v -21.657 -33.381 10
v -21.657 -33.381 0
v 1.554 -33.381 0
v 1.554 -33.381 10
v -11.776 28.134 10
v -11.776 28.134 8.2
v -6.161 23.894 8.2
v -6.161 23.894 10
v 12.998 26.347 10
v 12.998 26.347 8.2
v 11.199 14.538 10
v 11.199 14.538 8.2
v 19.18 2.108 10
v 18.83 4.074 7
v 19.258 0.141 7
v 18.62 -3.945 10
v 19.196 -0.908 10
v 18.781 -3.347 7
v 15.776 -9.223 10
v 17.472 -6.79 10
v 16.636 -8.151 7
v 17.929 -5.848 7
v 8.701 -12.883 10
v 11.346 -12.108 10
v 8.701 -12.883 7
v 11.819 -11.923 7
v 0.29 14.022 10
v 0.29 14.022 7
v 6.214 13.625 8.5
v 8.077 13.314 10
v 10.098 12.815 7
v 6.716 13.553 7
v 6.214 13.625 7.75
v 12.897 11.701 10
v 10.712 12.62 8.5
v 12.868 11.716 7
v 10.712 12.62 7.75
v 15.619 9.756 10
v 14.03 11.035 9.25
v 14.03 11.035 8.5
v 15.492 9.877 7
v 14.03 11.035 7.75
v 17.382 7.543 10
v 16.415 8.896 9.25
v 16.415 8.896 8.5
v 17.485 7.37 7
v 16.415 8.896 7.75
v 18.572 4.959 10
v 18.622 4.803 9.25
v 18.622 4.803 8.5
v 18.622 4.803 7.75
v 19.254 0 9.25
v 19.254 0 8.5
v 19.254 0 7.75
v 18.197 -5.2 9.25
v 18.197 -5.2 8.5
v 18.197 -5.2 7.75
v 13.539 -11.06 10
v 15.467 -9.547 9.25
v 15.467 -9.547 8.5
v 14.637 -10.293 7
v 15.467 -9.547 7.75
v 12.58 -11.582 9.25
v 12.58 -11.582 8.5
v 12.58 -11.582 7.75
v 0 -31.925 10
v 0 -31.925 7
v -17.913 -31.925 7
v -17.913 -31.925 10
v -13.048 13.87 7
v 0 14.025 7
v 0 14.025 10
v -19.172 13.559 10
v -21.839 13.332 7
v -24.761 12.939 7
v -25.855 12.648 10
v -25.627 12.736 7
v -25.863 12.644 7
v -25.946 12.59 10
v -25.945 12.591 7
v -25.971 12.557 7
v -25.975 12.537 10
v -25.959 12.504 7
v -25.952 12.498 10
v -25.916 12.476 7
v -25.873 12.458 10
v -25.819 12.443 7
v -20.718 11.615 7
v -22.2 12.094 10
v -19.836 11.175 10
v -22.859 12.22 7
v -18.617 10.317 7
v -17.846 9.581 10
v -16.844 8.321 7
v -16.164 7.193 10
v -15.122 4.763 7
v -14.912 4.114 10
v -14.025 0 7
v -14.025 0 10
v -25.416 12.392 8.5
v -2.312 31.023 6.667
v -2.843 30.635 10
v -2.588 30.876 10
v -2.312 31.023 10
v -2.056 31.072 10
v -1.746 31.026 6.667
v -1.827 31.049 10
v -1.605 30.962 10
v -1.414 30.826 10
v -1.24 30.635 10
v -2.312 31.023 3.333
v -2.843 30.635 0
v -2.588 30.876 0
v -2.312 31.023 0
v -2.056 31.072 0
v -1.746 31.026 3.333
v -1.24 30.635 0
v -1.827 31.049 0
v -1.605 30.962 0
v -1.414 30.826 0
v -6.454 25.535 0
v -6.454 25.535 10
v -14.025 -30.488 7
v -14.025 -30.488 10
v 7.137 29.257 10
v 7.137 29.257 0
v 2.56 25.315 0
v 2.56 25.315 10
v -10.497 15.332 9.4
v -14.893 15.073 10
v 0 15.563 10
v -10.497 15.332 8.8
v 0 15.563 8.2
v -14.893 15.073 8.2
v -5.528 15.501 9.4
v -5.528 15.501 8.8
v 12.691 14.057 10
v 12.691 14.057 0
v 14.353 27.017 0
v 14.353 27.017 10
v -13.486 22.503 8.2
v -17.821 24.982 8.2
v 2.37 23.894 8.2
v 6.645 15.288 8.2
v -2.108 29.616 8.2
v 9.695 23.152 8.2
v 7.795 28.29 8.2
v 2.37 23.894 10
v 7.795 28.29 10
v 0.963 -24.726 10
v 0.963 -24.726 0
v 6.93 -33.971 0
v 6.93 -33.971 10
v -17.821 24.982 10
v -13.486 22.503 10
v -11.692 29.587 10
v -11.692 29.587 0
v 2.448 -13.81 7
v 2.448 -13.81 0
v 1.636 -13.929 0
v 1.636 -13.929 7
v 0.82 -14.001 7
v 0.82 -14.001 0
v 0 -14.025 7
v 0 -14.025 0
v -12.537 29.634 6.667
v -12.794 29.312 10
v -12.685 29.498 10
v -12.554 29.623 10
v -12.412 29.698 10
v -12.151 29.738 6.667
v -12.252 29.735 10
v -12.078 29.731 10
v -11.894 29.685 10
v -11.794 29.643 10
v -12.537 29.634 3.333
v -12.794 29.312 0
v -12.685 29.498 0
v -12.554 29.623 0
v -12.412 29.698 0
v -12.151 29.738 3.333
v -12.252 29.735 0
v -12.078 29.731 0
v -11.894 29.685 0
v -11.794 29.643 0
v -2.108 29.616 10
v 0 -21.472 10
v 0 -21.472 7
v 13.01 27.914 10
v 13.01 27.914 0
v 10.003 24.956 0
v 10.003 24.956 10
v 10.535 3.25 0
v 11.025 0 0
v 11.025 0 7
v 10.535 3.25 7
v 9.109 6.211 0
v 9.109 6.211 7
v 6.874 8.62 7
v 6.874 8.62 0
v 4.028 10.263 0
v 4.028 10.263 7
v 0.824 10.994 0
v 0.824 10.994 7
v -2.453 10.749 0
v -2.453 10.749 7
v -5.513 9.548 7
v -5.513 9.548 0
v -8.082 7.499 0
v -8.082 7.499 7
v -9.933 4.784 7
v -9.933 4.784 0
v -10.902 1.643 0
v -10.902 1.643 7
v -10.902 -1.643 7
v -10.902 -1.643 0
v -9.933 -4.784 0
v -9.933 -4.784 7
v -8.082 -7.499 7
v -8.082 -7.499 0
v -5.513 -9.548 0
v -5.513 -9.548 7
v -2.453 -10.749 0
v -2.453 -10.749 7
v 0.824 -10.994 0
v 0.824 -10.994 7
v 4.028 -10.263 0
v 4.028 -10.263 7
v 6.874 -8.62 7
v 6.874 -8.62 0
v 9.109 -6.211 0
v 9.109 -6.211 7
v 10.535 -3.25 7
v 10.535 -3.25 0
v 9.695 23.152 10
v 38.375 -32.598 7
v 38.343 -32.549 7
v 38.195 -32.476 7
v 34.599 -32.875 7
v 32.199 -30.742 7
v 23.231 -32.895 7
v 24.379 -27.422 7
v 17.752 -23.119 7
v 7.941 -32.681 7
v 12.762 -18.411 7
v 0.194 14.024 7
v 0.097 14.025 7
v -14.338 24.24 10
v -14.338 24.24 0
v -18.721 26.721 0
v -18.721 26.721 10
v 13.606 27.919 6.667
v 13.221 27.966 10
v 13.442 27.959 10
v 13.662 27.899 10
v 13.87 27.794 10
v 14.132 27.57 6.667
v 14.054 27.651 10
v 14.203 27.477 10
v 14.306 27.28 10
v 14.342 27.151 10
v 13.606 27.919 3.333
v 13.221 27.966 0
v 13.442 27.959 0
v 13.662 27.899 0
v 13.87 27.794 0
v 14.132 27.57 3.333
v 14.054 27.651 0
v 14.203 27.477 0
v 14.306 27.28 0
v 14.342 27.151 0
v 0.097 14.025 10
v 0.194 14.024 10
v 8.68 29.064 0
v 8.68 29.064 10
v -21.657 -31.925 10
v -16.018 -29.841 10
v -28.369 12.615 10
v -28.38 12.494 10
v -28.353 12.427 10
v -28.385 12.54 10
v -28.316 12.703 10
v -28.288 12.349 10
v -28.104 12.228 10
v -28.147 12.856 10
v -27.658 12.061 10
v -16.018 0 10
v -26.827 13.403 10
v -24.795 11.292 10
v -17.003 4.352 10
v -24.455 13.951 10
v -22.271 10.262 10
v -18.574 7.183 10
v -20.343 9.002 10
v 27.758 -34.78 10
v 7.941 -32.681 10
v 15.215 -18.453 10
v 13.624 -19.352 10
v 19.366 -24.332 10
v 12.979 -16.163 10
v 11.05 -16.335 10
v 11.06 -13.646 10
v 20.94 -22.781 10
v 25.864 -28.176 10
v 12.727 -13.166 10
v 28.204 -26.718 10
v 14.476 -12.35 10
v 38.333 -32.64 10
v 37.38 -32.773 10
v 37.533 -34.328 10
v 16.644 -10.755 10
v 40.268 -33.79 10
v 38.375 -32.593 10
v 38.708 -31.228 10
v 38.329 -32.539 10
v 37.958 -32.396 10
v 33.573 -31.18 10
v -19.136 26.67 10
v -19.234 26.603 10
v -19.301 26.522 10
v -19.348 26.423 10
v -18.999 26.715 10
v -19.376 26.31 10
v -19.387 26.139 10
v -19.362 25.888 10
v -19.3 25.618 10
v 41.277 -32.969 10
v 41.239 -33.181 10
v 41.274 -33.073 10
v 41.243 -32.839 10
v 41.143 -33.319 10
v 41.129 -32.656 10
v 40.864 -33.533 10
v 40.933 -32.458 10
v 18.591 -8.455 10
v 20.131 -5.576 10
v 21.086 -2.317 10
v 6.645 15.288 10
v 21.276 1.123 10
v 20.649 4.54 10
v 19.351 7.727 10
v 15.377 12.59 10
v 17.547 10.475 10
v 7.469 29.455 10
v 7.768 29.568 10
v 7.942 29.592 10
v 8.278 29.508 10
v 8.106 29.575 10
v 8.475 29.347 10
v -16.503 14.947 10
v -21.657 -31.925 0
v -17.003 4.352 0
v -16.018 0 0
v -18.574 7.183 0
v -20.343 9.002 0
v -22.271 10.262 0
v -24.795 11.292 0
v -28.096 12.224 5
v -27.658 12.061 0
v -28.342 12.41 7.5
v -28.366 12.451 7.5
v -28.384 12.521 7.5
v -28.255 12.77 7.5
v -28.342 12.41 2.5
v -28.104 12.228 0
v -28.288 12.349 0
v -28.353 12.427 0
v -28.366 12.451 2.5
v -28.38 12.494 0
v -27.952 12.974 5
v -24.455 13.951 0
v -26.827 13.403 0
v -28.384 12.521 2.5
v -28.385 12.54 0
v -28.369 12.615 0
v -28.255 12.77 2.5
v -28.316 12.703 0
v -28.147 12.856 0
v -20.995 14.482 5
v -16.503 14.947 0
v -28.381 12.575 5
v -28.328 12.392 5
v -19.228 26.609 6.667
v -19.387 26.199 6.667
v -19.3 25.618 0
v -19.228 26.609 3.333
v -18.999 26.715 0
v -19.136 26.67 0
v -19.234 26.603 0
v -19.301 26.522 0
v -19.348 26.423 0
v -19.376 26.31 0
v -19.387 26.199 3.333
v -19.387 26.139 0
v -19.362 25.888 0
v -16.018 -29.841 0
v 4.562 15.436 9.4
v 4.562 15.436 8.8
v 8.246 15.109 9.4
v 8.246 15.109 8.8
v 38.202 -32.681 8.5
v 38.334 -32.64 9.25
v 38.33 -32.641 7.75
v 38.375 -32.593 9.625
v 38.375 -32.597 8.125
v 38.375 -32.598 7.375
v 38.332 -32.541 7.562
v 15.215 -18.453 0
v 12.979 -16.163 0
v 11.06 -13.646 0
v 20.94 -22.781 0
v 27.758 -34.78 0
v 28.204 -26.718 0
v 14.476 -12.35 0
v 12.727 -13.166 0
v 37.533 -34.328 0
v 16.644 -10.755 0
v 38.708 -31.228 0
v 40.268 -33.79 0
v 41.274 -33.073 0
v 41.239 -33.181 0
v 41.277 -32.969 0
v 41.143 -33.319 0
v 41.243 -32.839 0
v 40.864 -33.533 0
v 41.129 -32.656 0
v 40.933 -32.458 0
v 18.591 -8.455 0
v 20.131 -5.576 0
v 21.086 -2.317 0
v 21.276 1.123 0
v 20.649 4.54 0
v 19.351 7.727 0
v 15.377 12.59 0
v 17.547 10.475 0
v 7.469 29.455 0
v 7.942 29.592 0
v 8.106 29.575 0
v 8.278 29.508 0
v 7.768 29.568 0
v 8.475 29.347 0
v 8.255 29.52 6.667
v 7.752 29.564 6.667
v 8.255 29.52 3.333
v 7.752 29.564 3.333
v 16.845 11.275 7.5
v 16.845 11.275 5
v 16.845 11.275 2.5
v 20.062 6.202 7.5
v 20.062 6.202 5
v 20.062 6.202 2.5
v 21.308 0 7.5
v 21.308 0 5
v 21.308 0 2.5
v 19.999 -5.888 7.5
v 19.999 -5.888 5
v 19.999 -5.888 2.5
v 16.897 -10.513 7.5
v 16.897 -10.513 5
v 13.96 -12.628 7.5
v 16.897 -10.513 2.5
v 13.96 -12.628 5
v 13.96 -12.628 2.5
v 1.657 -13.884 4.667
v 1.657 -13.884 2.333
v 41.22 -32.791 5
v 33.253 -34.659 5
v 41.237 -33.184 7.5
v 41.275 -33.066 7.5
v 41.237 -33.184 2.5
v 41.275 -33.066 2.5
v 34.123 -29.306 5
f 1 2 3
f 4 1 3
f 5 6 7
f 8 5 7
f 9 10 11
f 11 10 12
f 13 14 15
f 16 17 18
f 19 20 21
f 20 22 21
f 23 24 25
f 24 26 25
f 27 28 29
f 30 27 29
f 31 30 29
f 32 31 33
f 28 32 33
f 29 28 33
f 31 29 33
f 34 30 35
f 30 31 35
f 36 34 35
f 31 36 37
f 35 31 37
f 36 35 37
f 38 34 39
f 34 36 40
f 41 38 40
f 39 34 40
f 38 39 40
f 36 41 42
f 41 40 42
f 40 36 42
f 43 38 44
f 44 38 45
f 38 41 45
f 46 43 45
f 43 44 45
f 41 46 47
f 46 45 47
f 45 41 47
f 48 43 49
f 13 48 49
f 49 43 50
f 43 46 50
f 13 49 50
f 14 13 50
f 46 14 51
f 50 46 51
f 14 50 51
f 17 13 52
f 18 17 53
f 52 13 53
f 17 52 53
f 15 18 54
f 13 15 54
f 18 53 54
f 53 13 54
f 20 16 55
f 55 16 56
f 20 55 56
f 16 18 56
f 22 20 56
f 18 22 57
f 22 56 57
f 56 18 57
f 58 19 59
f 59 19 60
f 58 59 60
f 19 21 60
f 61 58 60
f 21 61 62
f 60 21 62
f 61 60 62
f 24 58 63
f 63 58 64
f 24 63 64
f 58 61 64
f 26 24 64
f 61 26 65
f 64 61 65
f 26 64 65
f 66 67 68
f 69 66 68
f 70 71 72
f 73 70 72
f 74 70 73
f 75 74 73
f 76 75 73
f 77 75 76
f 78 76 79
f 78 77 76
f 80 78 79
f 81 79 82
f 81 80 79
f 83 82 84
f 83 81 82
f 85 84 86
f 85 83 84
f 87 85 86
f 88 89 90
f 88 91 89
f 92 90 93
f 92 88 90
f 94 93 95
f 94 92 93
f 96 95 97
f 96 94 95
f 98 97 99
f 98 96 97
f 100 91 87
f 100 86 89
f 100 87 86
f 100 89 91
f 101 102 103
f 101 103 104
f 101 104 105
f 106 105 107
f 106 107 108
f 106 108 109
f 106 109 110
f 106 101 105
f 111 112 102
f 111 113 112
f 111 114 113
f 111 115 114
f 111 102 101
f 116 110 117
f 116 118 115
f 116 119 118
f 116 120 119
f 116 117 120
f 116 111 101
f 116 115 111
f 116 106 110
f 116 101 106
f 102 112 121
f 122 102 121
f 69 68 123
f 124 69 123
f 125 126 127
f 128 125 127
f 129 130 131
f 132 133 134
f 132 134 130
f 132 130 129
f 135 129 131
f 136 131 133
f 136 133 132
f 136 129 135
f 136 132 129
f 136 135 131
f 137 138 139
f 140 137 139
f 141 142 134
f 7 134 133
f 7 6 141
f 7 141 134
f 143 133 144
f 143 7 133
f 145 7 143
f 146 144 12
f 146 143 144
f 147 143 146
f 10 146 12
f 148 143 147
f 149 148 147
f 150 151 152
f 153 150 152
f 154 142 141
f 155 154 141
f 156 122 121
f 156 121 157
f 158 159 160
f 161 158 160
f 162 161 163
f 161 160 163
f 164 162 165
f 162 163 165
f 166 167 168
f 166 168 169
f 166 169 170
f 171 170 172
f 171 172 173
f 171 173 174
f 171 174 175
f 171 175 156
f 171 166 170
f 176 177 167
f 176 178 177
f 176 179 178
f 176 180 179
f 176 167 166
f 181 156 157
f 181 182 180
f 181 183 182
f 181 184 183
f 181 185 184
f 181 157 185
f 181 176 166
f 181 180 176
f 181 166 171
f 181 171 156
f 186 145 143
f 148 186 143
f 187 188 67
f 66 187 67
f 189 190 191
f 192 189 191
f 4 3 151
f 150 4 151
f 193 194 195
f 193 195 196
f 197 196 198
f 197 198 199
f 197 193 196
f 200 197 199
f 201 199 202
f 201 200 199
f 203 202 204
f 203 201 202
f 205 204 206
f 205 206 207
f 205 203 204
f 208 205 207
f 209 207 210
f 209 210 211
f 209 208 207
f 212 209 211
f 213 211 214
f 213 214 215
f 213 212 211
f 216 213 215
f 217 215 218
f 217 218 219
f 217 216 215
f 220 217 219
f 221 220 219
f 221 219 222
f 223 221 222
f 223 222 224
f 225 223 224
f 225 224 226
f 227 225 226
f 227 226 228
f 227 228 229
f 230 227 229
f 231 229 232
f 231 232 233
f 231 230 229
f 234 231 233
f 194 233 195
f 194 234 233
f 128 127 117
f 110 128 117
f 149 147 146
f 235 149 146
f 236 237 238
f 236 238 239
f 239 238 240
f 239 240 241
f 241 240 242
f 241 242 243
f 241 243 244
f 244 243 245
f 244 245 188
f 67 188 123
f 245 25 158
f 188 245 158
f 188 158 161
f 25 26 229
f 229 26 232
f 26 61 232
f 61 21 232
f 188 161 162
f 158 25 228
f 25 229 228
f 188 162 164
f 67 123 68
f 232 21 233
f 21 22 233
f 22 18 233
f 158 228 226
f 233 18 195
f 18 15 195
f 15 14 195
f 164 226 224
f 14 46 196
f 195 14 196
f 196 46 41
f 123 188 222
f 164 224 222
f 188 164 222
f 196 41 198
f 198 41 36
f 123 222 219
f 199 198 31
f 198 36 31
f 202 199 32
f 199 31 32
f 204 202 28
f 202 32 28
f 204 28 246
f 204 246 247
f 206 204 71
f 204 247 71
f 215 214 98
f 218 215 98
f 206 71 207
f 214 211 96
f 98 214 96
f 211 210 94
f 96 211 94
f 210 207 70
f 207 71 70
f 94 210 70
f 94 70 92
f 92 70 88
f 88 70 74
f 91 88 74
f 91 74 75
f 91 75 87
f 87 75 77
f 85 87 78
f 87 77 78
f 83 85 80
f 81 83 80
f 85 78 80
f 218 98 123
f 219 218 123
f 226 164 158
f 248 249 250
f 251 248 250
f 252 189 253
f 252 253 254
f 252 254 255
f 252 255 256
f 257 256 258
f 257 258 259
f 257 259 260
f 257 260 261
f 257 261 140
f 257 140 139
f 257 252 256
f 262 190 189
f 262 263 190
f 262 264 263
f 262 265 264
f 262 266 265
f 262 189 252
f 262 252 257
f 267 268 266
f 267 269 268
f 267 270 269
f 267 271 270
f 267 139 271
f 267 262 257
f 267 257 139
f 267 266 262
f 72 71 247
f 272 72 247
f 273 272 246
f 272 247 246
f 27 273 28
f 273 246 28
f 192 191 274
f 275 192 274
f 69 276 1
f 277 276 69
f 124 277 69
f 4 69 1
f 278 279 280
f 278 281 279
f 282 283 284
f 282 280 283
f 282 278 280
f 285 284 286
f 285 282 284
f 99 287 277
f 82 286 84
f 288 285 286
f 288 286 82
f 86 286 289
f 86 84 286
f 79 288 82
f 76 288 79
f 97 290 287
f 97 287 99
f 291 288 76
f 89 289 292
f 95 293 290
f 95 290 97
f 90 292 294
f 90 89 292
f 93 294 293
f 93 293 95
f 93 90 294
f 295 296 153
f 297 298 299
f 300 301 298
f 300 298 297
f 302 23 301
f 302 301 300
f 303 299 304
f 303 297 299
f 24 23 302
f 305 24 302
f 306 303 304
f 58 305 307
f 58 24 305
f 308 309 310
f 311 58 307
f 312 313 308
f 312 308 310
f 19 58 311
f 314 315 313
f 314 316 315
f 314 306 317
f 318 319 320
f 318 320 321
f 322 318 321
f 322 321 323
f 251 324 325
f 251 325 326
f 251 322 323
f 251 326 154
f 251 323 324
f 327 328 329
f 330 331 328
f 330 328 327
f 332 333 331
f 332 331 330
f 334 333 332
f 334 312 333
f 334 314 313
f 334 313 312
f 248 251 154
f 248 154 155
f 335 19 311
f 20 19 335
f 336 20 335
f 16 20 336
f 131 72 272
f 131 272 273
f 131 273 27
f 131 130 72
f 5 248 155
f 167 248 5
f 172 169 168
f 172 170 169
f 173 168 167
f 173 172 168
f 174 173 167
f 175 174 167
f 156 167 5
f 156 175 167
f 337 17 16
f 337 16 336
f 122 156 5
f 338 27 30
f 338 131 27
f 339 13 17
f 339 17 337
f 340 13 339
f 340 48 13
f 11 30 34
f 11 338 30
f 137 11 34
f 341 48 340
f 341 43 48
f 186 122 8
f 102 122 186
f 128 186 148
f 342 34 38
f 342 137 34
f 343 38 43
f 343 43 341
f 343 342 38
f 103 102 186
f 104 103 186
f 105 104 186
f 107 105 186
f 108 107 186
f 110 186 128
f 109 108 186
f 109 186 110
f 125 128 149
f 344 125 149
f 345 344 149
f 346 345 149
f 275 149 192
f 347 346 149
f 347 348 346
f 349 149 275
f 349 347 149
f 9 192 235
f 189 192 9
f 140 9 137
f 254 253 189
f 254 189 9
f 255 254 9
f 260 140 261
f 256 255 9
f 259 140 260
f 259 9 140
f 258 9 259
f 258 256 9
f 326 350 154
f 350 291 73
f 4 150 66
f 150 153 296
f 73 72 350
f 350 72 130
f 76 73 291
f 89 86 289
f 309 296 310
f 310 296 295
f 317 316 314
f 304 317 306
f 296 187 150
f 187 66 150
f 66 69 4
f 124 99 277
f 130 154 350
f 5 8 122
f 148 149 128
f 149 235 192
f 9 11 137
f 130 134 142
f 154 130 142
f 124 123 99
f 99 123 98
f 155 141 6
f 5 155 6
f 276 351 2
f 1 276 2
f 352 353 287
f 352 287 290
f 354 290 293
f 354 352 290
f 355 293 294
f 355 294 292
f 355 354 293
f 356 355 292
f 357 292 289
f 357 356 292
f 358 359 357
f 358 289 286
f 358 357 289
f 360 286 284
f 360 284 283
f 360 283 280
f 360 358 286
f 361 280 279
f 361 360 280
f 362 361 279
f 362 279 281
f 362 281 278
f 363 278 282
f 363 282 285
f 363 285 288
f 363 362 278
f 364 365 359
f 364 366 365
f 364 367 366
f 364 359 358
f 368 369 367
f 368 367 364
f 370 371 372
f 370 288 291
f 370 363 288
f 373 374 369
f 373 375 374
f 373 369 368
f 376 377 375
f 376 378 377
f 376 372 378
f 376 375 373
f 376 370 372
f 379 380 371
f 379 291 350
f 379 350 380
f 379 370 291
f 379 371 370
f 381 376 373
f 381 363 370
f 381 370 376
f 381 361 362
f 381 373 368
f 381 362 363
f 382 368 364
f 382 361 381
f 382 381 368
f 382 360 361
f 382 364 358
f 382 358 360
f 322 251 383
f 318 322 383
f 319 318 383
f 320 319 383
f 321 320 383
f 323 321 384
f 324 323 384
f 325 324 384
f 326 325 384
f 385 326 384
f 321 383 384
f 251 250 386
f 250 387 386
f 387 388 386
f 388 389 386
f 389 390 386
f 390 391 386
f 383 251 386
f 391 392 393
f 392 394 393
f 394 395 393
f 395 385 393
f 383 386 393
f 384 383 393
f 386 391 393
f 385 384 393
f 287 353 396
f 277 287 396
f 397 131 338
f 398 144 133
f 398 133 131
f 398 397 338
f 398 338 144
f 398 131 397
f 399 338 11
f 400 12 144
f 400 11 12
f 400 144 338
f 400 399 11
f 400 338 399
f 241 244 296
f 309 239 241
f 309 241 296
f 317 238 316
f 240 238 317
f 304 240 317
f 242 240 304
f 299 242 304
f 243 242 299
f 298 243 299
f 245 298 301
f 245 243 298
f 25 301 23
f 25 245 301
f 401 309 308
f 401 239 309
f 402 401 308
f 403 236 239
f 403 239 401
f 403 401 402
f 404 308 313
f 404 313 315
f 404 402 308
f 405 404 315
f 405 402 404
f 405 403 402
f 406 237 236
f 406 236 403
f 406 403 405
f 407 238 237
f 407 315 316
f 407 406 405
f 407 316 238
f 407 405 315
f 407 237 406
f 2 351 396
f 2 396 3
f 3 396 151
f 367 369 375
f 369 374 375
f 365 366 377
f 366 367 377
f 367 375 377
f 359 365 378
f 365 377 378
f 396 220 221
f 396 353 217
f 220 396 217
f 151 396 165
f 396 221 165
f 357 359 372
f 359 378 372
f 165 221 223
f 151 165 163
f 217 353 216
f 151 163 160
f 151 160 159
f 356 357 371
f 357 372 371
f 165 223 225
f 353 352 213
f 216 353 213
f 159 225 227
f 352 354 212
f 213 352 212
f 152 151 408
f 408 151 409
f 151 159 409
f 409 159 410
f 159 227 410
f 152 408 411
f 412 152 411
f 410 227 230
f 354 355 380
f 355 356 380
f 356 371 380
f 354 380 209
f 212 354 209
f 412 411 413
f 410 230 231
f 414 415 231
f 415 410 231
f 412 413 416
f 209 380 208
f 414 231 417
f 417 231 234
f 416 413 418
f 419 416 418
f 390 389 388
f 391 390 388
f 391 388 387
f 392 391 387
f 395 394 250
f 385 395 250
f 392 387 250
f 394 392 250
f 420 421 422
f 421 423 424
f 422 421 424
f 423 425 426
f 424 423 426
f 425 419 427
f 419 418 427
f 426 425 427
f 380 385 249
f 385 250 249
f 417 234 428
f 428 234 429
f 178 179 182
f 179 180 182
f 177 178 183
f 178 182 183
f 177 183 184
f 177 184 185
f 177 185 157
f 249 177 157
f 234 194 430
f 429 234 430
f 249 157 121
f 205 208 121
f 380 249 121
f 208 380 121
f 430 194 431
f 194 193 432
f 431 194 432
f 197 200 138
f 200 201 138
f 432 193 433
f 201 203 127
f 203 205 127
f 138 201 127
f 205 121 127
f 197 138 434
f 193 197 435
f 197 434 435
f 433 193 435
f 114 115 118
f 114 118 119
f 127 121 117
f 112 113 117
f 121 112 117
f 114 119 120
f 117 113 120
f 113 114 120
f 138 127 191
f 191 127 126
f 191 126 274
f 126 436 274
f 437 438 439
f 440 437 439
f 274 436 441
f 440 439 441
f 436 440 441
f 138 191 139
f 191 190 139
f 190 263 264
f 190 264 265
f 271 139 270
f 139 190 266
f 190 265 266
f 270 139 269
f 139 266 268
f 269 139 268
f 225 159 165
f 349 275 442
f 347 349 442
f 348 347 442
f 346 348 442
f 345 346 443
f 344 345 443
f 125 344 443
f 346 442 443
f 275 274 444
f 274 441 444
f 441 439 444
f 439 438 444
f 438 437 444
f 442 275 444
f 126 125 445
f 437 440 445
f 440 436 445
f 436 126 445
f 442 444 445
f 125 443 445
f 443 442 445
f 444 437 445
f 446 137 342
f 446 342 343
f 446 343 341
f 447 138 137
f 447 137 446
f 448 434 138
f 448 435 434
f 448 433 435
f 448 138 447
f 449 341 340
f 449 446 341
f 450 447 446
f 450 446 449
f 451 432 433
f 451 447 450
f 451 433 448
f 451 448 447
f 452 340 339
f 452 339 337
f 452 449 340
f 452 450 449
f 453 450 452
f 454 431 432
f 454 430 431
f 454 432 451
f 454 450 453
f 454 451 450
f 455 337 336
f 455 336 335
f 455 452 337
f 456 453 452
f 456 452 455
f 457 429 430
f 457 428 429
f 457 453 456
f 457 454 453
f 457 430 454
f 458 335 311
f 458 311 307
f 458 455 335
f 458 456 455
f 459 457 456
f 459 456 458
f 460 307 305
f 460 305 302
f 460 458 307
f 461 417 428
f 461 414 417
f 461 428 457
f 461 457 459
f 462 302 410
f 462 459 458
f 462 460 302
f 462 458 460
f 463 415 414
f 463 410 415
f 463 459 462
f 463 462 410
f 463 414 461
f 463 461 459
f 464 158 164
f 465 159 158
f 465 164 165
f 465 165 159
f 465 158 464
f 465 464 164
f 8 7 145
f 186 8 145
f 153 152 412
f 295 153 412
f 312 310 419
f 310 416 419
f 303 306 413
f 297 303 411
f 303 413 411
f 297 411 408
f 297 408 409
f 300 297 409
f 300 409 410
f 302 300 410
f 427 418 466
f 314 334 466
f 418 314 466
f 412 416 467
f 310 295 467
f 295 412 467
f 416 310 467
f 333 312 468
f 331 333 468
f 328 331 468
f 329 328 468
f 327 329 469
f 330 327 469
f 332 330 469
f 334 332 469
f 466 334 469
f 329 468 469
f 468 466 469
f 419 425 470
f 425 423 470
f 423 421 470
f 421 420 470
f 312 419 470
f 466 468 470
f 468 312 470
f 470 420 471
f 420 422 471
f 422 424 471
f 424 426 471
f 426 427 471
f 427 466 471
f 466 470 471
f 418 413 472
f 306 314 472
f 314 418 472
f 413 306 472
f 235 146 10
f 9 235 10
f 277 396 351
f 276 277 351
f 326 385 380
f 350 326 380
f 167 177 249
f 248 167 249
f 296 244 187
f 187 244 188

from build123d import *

# Parameters (mm, degrees)
F1_DEPTH = 10
F0_R     = 11.025
F2_DEPTH = 7
F3_DEPTH = 8.2


with BuildPart() as f1:
    # F0 (on Top) → F1 (new body)
    with BuildSketch(Plane.XY):
        with BuildLine():
            Line((-19.3000361323, 25.617852807), (-16.5027223659, 14.9471961935))
            add(Edge.make_bspline(
                [(-16.5027223659, 14.9471961935), (-15.9821834932, 14.9908863575), (-15.4454033317, 15.0328594986), (-14.8925539408, 15.0729105388)],
                knots=[0.8146444204, 0.8146444204, 0.8146444204, 0.8146444204, 0.8366556125, 0.8366556125, 0.8366556125, 0.8366556125], degree=3))
            Line((-14.8925539408, 15.0729105388), (-17.8214006024, 24.9819634817))
            Line((-17.8214006024, 24.9819634817), (-13.4857874364, 22.5029587746))
            Line((-13.4857874364, 22.5029587746), (-11.7759136483, 28.1340777874))
            Line((-11.7759136483, 28.1340777874), (-6.1606834643, 23.8938014954))
            Line((-6.1606834643, 23.8938014954), (-2.1075964905, 29.6155139804))
            Line((-2.1075964905, 29.6155139804), (2.369817812, 23.8938014954))
            Line((2.369817812, 23.8938014954), (7.7946316451, 28.2900184393))
            Line((7.7946316451, 28.2900184393), (9.6949217841, 23.1520179659))
            Line((9.6949217841, 23.1520179659), (12.9975004857, 26.3469954851))
            Line((12.9975004857, 26.3469954851), (11.199255367, 14.5383238121))
            add(Edge.make_bspline(
                [(11.199255367, 14.5383238121), (11.7299576144, 14.3959369713), (12.2254180774, 14.2360425799), (12.6910973587, 14.05701797)],
                knots=[0.1587326419, 0.1587326419, 0.1587326419, 0.1587326419, 0.1906610807, 0.1906610807, 0.1906610807, 0.1906610807], degree=3))
            Line((12.6910973587, 14.05701797), (14.3530135974, 27.0172487944))
            add(Edge.make_bspline(
                [(13.0104408682, 27.9140680165), (13.5631300509, 28.1455442309), (14.3618108705, 27.6210475713), (14.3530135974, 27.0172487944)],
                knots=[0, 0, 0, 0, 1.6145545052, 1.6145545052, 1.6145545052, 1.6145545052], degree=3))
            Line((13.0104408682, 27.9140680165), (10.0033283234, 24.9562524259))
            Line((10.0033283234, 24.9562524259), (8.6801284924, 29.0636848658))
            add(Edge.make_bspline(
                [(8.6801284924, 29.0636848658), (8.282721974, 29.7467447817), (7.8180013224, 29.7191031277), (7.1373213177, 29.2566530406)],
                knots=[0, 0, 0, 0, 1.5548281882, 1.5548281882, 1.5548281882, 1.5548281882], degree=3))
            Line((7.1373213177, 29.2566530406), (2.5603291579, 25.3146197647))
            Line((2.5603291579, 25.3146197647), (-1.2397119331, 30.6349862367))
            add(Edge.make_bspline(
                [(-2.8427368961, 30.6349862367), (-2.3610445205, 31.2117636204), (-1.6856613802, 31.2255471945), (-1.2397119331, 30.6349862367)],
                knots=[0, 0, 0, 0, 1.603024963, 1.603024963, 1.603024963, 1.603024963], degree=3))
            Line((-2.8427368961, 30.6349862367), (-6.4539699815, 25.5351532251))
            Line((-6.4539699815, 25.5351532251), (-11.6916364059, 29.5874532312))
            add(Edge.make_bspline(
                [(-12.7943027765, 29.3117854744), (-12.6205328852, 29.7315195203), (-12.1682910249, 29.876427725), (-11.6916364059, 29.5874532312)],
                knots=[0, 0, 0, 0, 1.1366027613, 1.1366027613, 1.1366027613, 1.1366027613], degree=3))
            Line((-12.7943027765, 29.3117854744), (-14.3380360678, 24.239519611))
            Line((-14.3380360678, 24.239519611), (-18.7211353332, 26.7205201089))
            add(Edge.make_bspline(
                [(-18.7211353332, 26.7205201089), (-19.4361973554, 26.7992690206), (-19.4751825184, 26.2437313795), (-19.3000361323, 25.617852807)],
                knots=[0, 0, 0, 0, 1.2453920322, 1.2453920322, 1.2453920322, 1.2453920322], degree=3))
        make_face()
        with BuildLine():
            add(Edge.make_bspline(
                [(-16.0178430378, 0), (-17.0891042799, 11.2457247451), (-34.3895874626, 11.4951487861), (-25.4101731911, 14.199570976), (-16.5027223659, 14.9471961935)],
                knots=[0, 0, 0, 0, 0.4379893378, 0.8146444204, 0.8146444204, 0.8146444204, 0.8146444204], degree=3))
            Line((-16.0178430378, 0), (-16.0178430378, -29.8405252397))
            Line((-16.0178430378, -29.8405252397), (-21.6572081245, -31.9249667227))
            Line((-21.6572081245, -31.9249667227), (-21.6572081245, -33.3810336888))
            Line((-21.6572081245, -33.3810336888), (1.5535618877, -33.3810336888))
            Line((1.5535618877, -33.3810336888), (0.9634781745, -24.7264597565))
            Line((0.9634781745, -24.7264597565), (6.929886993, -33.9711159468))
            add(Edge.make_bspline(
                [(6.929886993, -33.9711159468), (24.8493433086, -35.2838962809), (60.3720002804, -34.8670480548), (19.1815471681, -25.9585702534), (11.0604790971, -13.6459805071)],
                knots=[0, 0, 0, 0, 0.4949574997, 1, 1, 1, 1], degree=3))
            add(Edge.make_bspline(
                [(12.6910973587, 14.05701797), (14.3809471326, 13.4073762346), (18.5460833461, 10.5137101685), (23.2371850237, 0.0289954641), (17.8748979072, -11.1493005541), (12.8722470254, -13.2691906765), (11.0604790971, -13.6459805071)],
                knots=[0.1906610807, 0.1906610807, 0.1906610807, 0.1906610807, 0.3065225054, 0.5625365171, 0.8107732693, 1, 1, 1, 1], degree=3))
            add(Edge.make_bspline(
                [(11.199255367, 14.5383238121), (11.7299576144, 14.3959369713), (12.2254180774, 14.2360425799), (12.6910973587, 14.05701797)],
                knots=[0.1587326419, 0.1587326419, 0.1587326419, 0.1587326419, 0.1906610807, 0.1906610807, 0.1906610807, 0.1906610807], degree=3))
            add(Edge.make_bspline(
                [(0, 15.5631974339), (5.0514355202, 15.5213642545), (8.5608623501, 15.246201814), (11.199255367, 14.5383238121)],
                knots=[0, 0, 0, 0, 0.1587326419, 0.1587326419, 0.1587326419, 0.1587326419], degree=3))
            add(Edge.make_bspline(
                [(-14.8925539408, 15.0729105388), (-10.7898754349, 15.3701280895), (-5.8022517829, 15.5614940305), (0, 15.5631974339)],
                knots=[0.8366556125, 0.8366556125, 0.8366556125, 0.8366556125, 1, 1, 1, 1], degree=3))
            add(Edge.make_bspline(
                [(-16.5027223659, 14.9471961935), (-15.9821834932, 14.9908863575), (-15.4454033317, 15.0328594986), (-14.8925539408, 15.0729105388)],
                knots=[0.8146444204, 0.8146444204, 0.8146444204, 0.8146444204, 0.8366556125, 0.8366556125, 0.8366556125, 0.8366556125], degree=3))
        make_face()
        with BuildLine():
            add(Edge.make_bspline(
                [(0, 14.025), (-22.2927219479, 14.1532437558), (-32.5429377718, 11.2364486318), (-15.8938150439, 13.1059148162), (-14.025, 0)],
                knots=[0, 0, 0, 0, 0.5515868686, 1, 1, 1, 1], degree=3))
            ThreePointArc((0, 14.025), (0.1451418598, 14.0242489582), (0.2902681747, 14.0219959131))
            add(Edge.make_bspline(
                [(0.2902681747, 14.0219959131), (9.2486399688, 13.9105710304), (17.0995105355, 10.759716712), (20.385285187, 0.0139246379), (16.8992797962, -9.7633800937), (11.6691263972, -12.2065090216), (8.7014966008, -12.8828223231)],
                knots=[0.0030566307, 0.0030566307, 0.0030566307, 0.0030566307, 0.2875779073, 0.4994840668, 0.7217267051, 0.8772385131, 0.8772385131, 0.8772385131, 0.8772385131], degree=3))
            add(Edge.make_bspline(
                [(7.9412147987, -32.6805368676), (13.8764368589, -32.813362548), (60.0064221878, -33.4995761154), (19.4618183039, -30.7597754392), (8.7014966151, -12.8828223083)],
                knots=[0, 0, 0, 0, 0.4752172088, 0.9876392002, 0.9876392002, 0.9876392002, 0.9876392002], degree=3))
            Line((7.9412147987, -32.6805368676), (0, -21.472029388))
            Line((0, -21.472029388), (0, -31.9249667227))
            Line((0, -31.9249667227), (-17.9133024067, -31.9249667227))
            Line((-17.9133024067, -31.9249667227), (-14.025, -30.4877590388))
            Line((-14.025, -30.4877590388), (-14.025, 0))
        make_face(mode=Mode.SUBTRACT)
    extrude(amount=F1_DEPTH)

    # F0 (on Top) → F2 (join)
    with BuildSketch(Plane.XY):
        with BuildLine():
            add(Edge.make_bspline(
                [(-16.0178430378, 0), (-17.0891042799, 11.2457247451), (-34.3895874626, 11.4951487861), (-25.4101731911, 14.199570976), (-16.5027223659, 14.9471961935)],
                knots=[0, 0, 0, 0, 0.4379893378, 0.8146444204, 0.8146444204, 0.8146444204, 0.8146444204], degree=3))
            Line((-16.0178430378, 0), (-16.0178430378, -29.8405252397))
            Line((-16.0178430378, -29.8405252397), (-21.6572081245, -31.9249667227))
            Line((-21.6572081245, -31.9249667227), (-21.6572081245, -33.3810336888))
            Line((-21.6572081245, -33.3810336888), (1.5535618877, -33.3810336888))
            Line((1.5535618877, -33.3810336888), (0.9634781745, -24.7264597565))
            Line((0.9634781745, -24.7264597565), (6.929886993, -33.9711159468))
            add(Edge.make_bspline(
                [(6.929886993, -33.9711159468), (24.8493433086, -35.2838962809), (60.3720002804, -34.8670480548), (19.1815471681, -25.9585702534), (11.0604790971, -13.6459805071)],
                knots=[0, 0, 0, 0, 0.4949574997, 1, 1, 1, 1], degree=3))
            add(Edge.make_bspline(
                [(12.6910973587, 14.05701797), (14.3809471326, 13.4073762346), (18.5460833461, 10.5137101685), (23.2371850237, 0.0289954641), (17.8748979072, -11.1493005541), (12.8722470254, -13.2691906765), (11.0604790971, -13.6459805071)],
                knots=[0.1906610807, 0.1906610807, 0.1906610807, 0.1906610807, 0.3065225054, 0.5625365171, 0.8107732693, 1, 1, 1, 1], degree=3))
            add(Edge.make_bspline(
                [(11.199255367, 14.5383238121), (11.7299576144, 14.3959369713), (12.2254180774, 14.2360425799), (12.6910973587, 14.05701797)],
                knots=[0.1587326419, 0.1587326419, 0.1587326419, 0.1587326419, 0.1906610807, 0.1906610807, 0.1906610807, 0.1906610807], degree=3))
            add(Edge.make_bspline(
                [(0, 15.5631974339), (5.0514355202, 15.5213642545), (8.5608623501, 15.246201814), (11.199255367, 14.5383238121)],
                knots=[0, 0, 0, 0, 0.1587326419, 0.1587326419, 0.1587326419, 0.1587326419], degree=3))
            add(Edge.make_bspline(
                [(-14.8925539408, 15.0729105388), (-10.7898754349, 15.3701280895), (-5.8022517829, 15.5614940305), (0, 15.5631974339)],
                knots=[0.8366556125, 0.8366556125, 0.8366556125, 0.8366556125, 1, 1, 1, 1], degree=3))
            add(Edge.make_bspline(
                [(-16.5027223659, 14.9471961935), (-15.9821834932, 14.9908863575), (-15.4454033317, 15.0328594986), (-14.8925539408, 15.0729105388)],
                knots=[0.8146444204, 0.8146444204, 0.8146444204, 0.8146444204, 0.8366556125, 0.8366556125, 0.8366556125, 0.8366556125], degree=3))
        make_face()
        with BuildLine():
            add(Edge.make_bspline(
                [(0, 14.025), (-22.2927219479, 14.1532437558), (-32.5429377718, 11.2364486318), (-15.8938150439, 13.1059148162), (-14.025, 0)],
                knots=[0, 0, 0, 0, 0.5515868686, 1, 1, 1, 1], degree=3))
            ThreePointArc((0, 14.025), (0.1451418598, 14.0242489582), (0.2902681747, 14.0219959131))
            add(Edge.make_bspline(
                [(0.2902681747, 14.0219959131), (9.2486399688, 13.9105710304), (17.0995105355, 10.759716712), (20.385285187, 0.0139246379), (16.8992797962, -9.7633800937), (11.6691263972, -12.2065090216), (8.7014966008, -12.8828223231)],
                knots=[0.0030566307, 0.0030566307, 0.0030566307, 0.0030566307, 0.2875779073, 0.4994840668, 0.7217267051, 0.8772385131, 0.8772385131, 0.8772385131, 0.8772385131], degree=3))
            add(Edge.make_bspline(
                [(7.9412147987, -32.6805368676), (13.8764368589, -32.813362548), (60.0064221878, -33.4995761154), (19.4618183039, -30.7597754392), (8.7014966151, -12.8828223083)],
                knots=[0, 0, 0, 0, 0.4752172088, 0.9876392002, 0.9876392002, 0.9876392002, 0.9876392002], degree=3))
            Line((7.9412147987, -32.6805368676), (0, -21.472029388))
            Line((0, -21.472029388), (0, -31.9249667227))
            Line((0, -31.9249667227), (-17.9133024067, -31.9249667227))
            Line((-17.9133024067, -31.9249667227), (-14.025, -30.4877590388))
            Line((-14.025, -30.4877590388), (-14.025, 0))
        make_face(mode=Mode.SUBTRACT)
        with BuildLine():
            ThreePointArc((0, -14.025), (-9.9171726061, -9.9171726061), (-14.025, 0))
            Line((-14.025, 0), (-14.025, -30.4877590388))
            Line((-14.025, -30.4877590388), (-17.9133024067, -31.9249667227))
            Line((-17.9133024067, -31.9249667227), (0, -31.9249667227))
            Line((0, -31.9249667227), (0, -21.472029388))
            Line((0, -21.472029388), (7.9412147987, -32.6805368676))
            add(Edge.make_bspline(
                [(7.9412147987, -32.6805368676), (13.8764368589, -32.813362548), (60.0064221878, -33.4995761154), (19.4618183039, -30.7597754392), (8.7014966151, -12.8828223083)],
                knots=[0, 0, 0, 0, 0.4752172088, 0.9876392002, 0.9876392002, 0.9876392002, 0.9876392002], degree=3))
            add(Edge.make_bspline(
                [(8.7014966008, -12.8828223231), (6.9291756993, -13.2867285657), (4.8663444244, -13.5731266075), (2.4476929742, -13.8097582927)],
                knots=[0.8772385131, 0.8772385131, 0.8772385131, 0.8772385131, 0.9701129101, 0.9701129101, 0.9701129101, 0.9701129101], degree=3))
            ThreePointArc((2.4476929742, -13.8097582927), (1.2285692785, -13.9710859466), (0, -14.025))
        make_face()
        with BuildLine():
            add(Edge.make_bspline(
                [(0, 14.025), (0.0972728272, 14.0241944405), (0.1940278004, 14.0231929579), (0.2902681747, 14.0219959131)],
                knots=[0, 0, 0, 0, 0.0030566307, 0.0030566307, 0.0030566307, 0.0030566307], degree=3))
            ThreePointArc((0, 14.025), (-9.9171726061, 9.9171726061), (-14.025, 0))
            ThreePointArc((-14.025, 0), (-9.9171726061, -9.9171726061), (0, -14.025))
            add(Edge.make_bspline(
                [(2.4476929742, -13.8097582927), (1.6693680994, -13.8859066467), (0.8541959122, -13.9569013961), (0, -14.025)],
                knots=[0.9701129101, 0.9701129101, 0.9701129101, 0.9701129101, 1, 1, 1, 1], degree=3))
            ThreePointArc((2.4476929742, -13.8097582927), (5.3148380237, -12.9789491786), (7.9412147987, -11.5601787409))
            ThreePointArc((7.9412147987, -11.5601787409), (12.4112078895, -6.5316570428), (14.025, 0))
            ThreePointArc((14.025, 0), (10.0192723326, 9.8140107461), (0.2902681747, 14.0219959131))
        make_face()
        Circle(F0_R, mode=Mode.SUBTRACT)
        with BuildLine():
            add(Edge.make_bspline(
                [(0.2902681747, 14.0219959131), (9.2486399688, 13.9105710304), (17.0995105355, 10.759716712), (20.385285187, 0.0139246379), (16.8992797962, -9.7633800937), (11.6691263972, -12.2065090216), (8.7014966008, -12.8828223231)],
                knots=[0.0030566307, 0.0030566307, 0.0030566307, 0.0030566307, 0.2875779073, 0.4994840668, 0.7217267051, 0.8772385131, 0.8772385131, 0.8772385131, 0.8772385131], degree=3))
            ThreePointArc((0.2902681747, 14.0219959131), (10.0192723326, 9.8140107461), (14.025, 0))
            ThreePointArc((14.025, 0), (12.4112078895, -6.5316570428), (7.9412147987, -11.5601787409))
            add(Edge.make_bspline(
                [(8.7014966151, -12.8828223083), (8.4419328487, -12.4515889846), (8.1883483332, -12.0107804723), (7.9412147987, -11.5601787409)],
                knots=[0.9876392002, 0.9876392002, 0.9876392002, 0.9876392002, 1, 1, 1, 1], degree=3))
        make_face()
        with BuildLine():
            ThreePointArc((-14.025, 0), (-9.9171726061, 9.9171726061), (0, 14.025))
            add(Edge.make_bspline(
                [(0, 14.025), (-22.2927219479, 14.1532437558), (-32.5429377718, 11.2364486318), (-15.8938150439, 13.1059148162), (-14.025, 0)],
                knots=[0, 0, 0, 0, 0.5515868686, 1, 1, 1, 1], degree=3))
        make_face()
        with BuildLine():
            add(Edge.make_bspline(
                [(8.7014966008, -12.8828223231), (6.9291756993, -13.2867285657), (4.8663444244, -13.5731266075), (2.4476929742, -13.8097582927)],
                knots=[0.8772385131, 0.8772385131, 0.8772385131, 0.8772385131, 0.9701129101, 0.9701129101, 0.9701129101, 0.9701129101], degree=3))
            add(Edge.make_bspline(
                [(8.7014966151, -12.8828223083), (8.4419328487, -12.4515889846), (8.1883483332, -12.0107804723), (7.9412147987, -11.5601787409)],
                knots=[0.9876392002, 0.9876392002, 0.9876392002, 0.9876392002, 1, 1, 1, 1], degree=3))
            ThreePointArc((7.9412147987, -11.5601787409), (5.3148380237, -12.9789491786), (2.4476929742, -13.8097582927))
        make_face()
        with BuildLine():
            ThreePointArc((0.2902681747, 14.0219959131), (0.1451418598, 14.0242489582), (0, 14.025))
            add(Edge.make_bspline(
                [(0, 14.025), (0.0972728272, 14.0241944405), (0.1940278004, 14.0231929579), (0.2902681747, 14.0219959131)],
                knots=[0, 0, 0, 0, 0.0030566307, 0.0030566307, 0.0030566307, 0.0030566307], degree=3))
        make_face()
    extrude(amount=F2_DEPTH)

    # F0 (on Top) → F3 (join)
    with BuildSketch(Plane.XY):
        with BuildLine():
            Line((-17.8214006024, 24.9819634817), (-14.8925539408, 15.0729105388))
            add(Edge.make_bspline(
                [(-14.8925539408, 15.0729105388), (-10.7898754349, 15.3701280895), (-5.8022517829, 15.5614940305), (0, 15.5631974339)],
                knots=[0.8366556125, 0.8366556125, 0.8366556125, 0.8366556125, 1, 1, 1, 1], degree=3))
            add(Edge.make_bspline(
                [(0, 15.5631974339), (5.0514355202, 15.5213642545), (8.5608623501, 15.246201814), (11.199255367, 14.5383238121)],
                knots=[0, 0, 0, 0, 0.1587326419, 0.1587326419, 0.1587326419, 0.1587326419], degree=3))
            Line((11.199255367, 14.5383238121), (12.9975004857, 26.3469954851))
            Line((12.9975004857, 26.3469954851), (9.6949217841, 23.1520179659))
            Line((9.6949217841, 23.1520179659), (7.7946316451, 28.2900184393))
            Line((7.7946316451, 28.2900184393), (2.369817812, 23.8938014954))
            Line((2.369817812, 23.8938014954), (-2.1075964905, 29.6155139804))
            Line((-2.1075964905, 29.6155139804), (-6.1606834643, 23.8938014954))
            Line((-6.1606834643, 23.8938014954), (-11.7759136483, 28.1340777874))
            Line((-11.7759136483, 28.1340777874), (-13.4857874364, 22.5029587746))
            Line((-13.4857874364, 22.5029587746), (-17.8214006024, 24.9819634817))
        make_face()
    extrude(amount=F3_DEPTH)


solid = f1.part
